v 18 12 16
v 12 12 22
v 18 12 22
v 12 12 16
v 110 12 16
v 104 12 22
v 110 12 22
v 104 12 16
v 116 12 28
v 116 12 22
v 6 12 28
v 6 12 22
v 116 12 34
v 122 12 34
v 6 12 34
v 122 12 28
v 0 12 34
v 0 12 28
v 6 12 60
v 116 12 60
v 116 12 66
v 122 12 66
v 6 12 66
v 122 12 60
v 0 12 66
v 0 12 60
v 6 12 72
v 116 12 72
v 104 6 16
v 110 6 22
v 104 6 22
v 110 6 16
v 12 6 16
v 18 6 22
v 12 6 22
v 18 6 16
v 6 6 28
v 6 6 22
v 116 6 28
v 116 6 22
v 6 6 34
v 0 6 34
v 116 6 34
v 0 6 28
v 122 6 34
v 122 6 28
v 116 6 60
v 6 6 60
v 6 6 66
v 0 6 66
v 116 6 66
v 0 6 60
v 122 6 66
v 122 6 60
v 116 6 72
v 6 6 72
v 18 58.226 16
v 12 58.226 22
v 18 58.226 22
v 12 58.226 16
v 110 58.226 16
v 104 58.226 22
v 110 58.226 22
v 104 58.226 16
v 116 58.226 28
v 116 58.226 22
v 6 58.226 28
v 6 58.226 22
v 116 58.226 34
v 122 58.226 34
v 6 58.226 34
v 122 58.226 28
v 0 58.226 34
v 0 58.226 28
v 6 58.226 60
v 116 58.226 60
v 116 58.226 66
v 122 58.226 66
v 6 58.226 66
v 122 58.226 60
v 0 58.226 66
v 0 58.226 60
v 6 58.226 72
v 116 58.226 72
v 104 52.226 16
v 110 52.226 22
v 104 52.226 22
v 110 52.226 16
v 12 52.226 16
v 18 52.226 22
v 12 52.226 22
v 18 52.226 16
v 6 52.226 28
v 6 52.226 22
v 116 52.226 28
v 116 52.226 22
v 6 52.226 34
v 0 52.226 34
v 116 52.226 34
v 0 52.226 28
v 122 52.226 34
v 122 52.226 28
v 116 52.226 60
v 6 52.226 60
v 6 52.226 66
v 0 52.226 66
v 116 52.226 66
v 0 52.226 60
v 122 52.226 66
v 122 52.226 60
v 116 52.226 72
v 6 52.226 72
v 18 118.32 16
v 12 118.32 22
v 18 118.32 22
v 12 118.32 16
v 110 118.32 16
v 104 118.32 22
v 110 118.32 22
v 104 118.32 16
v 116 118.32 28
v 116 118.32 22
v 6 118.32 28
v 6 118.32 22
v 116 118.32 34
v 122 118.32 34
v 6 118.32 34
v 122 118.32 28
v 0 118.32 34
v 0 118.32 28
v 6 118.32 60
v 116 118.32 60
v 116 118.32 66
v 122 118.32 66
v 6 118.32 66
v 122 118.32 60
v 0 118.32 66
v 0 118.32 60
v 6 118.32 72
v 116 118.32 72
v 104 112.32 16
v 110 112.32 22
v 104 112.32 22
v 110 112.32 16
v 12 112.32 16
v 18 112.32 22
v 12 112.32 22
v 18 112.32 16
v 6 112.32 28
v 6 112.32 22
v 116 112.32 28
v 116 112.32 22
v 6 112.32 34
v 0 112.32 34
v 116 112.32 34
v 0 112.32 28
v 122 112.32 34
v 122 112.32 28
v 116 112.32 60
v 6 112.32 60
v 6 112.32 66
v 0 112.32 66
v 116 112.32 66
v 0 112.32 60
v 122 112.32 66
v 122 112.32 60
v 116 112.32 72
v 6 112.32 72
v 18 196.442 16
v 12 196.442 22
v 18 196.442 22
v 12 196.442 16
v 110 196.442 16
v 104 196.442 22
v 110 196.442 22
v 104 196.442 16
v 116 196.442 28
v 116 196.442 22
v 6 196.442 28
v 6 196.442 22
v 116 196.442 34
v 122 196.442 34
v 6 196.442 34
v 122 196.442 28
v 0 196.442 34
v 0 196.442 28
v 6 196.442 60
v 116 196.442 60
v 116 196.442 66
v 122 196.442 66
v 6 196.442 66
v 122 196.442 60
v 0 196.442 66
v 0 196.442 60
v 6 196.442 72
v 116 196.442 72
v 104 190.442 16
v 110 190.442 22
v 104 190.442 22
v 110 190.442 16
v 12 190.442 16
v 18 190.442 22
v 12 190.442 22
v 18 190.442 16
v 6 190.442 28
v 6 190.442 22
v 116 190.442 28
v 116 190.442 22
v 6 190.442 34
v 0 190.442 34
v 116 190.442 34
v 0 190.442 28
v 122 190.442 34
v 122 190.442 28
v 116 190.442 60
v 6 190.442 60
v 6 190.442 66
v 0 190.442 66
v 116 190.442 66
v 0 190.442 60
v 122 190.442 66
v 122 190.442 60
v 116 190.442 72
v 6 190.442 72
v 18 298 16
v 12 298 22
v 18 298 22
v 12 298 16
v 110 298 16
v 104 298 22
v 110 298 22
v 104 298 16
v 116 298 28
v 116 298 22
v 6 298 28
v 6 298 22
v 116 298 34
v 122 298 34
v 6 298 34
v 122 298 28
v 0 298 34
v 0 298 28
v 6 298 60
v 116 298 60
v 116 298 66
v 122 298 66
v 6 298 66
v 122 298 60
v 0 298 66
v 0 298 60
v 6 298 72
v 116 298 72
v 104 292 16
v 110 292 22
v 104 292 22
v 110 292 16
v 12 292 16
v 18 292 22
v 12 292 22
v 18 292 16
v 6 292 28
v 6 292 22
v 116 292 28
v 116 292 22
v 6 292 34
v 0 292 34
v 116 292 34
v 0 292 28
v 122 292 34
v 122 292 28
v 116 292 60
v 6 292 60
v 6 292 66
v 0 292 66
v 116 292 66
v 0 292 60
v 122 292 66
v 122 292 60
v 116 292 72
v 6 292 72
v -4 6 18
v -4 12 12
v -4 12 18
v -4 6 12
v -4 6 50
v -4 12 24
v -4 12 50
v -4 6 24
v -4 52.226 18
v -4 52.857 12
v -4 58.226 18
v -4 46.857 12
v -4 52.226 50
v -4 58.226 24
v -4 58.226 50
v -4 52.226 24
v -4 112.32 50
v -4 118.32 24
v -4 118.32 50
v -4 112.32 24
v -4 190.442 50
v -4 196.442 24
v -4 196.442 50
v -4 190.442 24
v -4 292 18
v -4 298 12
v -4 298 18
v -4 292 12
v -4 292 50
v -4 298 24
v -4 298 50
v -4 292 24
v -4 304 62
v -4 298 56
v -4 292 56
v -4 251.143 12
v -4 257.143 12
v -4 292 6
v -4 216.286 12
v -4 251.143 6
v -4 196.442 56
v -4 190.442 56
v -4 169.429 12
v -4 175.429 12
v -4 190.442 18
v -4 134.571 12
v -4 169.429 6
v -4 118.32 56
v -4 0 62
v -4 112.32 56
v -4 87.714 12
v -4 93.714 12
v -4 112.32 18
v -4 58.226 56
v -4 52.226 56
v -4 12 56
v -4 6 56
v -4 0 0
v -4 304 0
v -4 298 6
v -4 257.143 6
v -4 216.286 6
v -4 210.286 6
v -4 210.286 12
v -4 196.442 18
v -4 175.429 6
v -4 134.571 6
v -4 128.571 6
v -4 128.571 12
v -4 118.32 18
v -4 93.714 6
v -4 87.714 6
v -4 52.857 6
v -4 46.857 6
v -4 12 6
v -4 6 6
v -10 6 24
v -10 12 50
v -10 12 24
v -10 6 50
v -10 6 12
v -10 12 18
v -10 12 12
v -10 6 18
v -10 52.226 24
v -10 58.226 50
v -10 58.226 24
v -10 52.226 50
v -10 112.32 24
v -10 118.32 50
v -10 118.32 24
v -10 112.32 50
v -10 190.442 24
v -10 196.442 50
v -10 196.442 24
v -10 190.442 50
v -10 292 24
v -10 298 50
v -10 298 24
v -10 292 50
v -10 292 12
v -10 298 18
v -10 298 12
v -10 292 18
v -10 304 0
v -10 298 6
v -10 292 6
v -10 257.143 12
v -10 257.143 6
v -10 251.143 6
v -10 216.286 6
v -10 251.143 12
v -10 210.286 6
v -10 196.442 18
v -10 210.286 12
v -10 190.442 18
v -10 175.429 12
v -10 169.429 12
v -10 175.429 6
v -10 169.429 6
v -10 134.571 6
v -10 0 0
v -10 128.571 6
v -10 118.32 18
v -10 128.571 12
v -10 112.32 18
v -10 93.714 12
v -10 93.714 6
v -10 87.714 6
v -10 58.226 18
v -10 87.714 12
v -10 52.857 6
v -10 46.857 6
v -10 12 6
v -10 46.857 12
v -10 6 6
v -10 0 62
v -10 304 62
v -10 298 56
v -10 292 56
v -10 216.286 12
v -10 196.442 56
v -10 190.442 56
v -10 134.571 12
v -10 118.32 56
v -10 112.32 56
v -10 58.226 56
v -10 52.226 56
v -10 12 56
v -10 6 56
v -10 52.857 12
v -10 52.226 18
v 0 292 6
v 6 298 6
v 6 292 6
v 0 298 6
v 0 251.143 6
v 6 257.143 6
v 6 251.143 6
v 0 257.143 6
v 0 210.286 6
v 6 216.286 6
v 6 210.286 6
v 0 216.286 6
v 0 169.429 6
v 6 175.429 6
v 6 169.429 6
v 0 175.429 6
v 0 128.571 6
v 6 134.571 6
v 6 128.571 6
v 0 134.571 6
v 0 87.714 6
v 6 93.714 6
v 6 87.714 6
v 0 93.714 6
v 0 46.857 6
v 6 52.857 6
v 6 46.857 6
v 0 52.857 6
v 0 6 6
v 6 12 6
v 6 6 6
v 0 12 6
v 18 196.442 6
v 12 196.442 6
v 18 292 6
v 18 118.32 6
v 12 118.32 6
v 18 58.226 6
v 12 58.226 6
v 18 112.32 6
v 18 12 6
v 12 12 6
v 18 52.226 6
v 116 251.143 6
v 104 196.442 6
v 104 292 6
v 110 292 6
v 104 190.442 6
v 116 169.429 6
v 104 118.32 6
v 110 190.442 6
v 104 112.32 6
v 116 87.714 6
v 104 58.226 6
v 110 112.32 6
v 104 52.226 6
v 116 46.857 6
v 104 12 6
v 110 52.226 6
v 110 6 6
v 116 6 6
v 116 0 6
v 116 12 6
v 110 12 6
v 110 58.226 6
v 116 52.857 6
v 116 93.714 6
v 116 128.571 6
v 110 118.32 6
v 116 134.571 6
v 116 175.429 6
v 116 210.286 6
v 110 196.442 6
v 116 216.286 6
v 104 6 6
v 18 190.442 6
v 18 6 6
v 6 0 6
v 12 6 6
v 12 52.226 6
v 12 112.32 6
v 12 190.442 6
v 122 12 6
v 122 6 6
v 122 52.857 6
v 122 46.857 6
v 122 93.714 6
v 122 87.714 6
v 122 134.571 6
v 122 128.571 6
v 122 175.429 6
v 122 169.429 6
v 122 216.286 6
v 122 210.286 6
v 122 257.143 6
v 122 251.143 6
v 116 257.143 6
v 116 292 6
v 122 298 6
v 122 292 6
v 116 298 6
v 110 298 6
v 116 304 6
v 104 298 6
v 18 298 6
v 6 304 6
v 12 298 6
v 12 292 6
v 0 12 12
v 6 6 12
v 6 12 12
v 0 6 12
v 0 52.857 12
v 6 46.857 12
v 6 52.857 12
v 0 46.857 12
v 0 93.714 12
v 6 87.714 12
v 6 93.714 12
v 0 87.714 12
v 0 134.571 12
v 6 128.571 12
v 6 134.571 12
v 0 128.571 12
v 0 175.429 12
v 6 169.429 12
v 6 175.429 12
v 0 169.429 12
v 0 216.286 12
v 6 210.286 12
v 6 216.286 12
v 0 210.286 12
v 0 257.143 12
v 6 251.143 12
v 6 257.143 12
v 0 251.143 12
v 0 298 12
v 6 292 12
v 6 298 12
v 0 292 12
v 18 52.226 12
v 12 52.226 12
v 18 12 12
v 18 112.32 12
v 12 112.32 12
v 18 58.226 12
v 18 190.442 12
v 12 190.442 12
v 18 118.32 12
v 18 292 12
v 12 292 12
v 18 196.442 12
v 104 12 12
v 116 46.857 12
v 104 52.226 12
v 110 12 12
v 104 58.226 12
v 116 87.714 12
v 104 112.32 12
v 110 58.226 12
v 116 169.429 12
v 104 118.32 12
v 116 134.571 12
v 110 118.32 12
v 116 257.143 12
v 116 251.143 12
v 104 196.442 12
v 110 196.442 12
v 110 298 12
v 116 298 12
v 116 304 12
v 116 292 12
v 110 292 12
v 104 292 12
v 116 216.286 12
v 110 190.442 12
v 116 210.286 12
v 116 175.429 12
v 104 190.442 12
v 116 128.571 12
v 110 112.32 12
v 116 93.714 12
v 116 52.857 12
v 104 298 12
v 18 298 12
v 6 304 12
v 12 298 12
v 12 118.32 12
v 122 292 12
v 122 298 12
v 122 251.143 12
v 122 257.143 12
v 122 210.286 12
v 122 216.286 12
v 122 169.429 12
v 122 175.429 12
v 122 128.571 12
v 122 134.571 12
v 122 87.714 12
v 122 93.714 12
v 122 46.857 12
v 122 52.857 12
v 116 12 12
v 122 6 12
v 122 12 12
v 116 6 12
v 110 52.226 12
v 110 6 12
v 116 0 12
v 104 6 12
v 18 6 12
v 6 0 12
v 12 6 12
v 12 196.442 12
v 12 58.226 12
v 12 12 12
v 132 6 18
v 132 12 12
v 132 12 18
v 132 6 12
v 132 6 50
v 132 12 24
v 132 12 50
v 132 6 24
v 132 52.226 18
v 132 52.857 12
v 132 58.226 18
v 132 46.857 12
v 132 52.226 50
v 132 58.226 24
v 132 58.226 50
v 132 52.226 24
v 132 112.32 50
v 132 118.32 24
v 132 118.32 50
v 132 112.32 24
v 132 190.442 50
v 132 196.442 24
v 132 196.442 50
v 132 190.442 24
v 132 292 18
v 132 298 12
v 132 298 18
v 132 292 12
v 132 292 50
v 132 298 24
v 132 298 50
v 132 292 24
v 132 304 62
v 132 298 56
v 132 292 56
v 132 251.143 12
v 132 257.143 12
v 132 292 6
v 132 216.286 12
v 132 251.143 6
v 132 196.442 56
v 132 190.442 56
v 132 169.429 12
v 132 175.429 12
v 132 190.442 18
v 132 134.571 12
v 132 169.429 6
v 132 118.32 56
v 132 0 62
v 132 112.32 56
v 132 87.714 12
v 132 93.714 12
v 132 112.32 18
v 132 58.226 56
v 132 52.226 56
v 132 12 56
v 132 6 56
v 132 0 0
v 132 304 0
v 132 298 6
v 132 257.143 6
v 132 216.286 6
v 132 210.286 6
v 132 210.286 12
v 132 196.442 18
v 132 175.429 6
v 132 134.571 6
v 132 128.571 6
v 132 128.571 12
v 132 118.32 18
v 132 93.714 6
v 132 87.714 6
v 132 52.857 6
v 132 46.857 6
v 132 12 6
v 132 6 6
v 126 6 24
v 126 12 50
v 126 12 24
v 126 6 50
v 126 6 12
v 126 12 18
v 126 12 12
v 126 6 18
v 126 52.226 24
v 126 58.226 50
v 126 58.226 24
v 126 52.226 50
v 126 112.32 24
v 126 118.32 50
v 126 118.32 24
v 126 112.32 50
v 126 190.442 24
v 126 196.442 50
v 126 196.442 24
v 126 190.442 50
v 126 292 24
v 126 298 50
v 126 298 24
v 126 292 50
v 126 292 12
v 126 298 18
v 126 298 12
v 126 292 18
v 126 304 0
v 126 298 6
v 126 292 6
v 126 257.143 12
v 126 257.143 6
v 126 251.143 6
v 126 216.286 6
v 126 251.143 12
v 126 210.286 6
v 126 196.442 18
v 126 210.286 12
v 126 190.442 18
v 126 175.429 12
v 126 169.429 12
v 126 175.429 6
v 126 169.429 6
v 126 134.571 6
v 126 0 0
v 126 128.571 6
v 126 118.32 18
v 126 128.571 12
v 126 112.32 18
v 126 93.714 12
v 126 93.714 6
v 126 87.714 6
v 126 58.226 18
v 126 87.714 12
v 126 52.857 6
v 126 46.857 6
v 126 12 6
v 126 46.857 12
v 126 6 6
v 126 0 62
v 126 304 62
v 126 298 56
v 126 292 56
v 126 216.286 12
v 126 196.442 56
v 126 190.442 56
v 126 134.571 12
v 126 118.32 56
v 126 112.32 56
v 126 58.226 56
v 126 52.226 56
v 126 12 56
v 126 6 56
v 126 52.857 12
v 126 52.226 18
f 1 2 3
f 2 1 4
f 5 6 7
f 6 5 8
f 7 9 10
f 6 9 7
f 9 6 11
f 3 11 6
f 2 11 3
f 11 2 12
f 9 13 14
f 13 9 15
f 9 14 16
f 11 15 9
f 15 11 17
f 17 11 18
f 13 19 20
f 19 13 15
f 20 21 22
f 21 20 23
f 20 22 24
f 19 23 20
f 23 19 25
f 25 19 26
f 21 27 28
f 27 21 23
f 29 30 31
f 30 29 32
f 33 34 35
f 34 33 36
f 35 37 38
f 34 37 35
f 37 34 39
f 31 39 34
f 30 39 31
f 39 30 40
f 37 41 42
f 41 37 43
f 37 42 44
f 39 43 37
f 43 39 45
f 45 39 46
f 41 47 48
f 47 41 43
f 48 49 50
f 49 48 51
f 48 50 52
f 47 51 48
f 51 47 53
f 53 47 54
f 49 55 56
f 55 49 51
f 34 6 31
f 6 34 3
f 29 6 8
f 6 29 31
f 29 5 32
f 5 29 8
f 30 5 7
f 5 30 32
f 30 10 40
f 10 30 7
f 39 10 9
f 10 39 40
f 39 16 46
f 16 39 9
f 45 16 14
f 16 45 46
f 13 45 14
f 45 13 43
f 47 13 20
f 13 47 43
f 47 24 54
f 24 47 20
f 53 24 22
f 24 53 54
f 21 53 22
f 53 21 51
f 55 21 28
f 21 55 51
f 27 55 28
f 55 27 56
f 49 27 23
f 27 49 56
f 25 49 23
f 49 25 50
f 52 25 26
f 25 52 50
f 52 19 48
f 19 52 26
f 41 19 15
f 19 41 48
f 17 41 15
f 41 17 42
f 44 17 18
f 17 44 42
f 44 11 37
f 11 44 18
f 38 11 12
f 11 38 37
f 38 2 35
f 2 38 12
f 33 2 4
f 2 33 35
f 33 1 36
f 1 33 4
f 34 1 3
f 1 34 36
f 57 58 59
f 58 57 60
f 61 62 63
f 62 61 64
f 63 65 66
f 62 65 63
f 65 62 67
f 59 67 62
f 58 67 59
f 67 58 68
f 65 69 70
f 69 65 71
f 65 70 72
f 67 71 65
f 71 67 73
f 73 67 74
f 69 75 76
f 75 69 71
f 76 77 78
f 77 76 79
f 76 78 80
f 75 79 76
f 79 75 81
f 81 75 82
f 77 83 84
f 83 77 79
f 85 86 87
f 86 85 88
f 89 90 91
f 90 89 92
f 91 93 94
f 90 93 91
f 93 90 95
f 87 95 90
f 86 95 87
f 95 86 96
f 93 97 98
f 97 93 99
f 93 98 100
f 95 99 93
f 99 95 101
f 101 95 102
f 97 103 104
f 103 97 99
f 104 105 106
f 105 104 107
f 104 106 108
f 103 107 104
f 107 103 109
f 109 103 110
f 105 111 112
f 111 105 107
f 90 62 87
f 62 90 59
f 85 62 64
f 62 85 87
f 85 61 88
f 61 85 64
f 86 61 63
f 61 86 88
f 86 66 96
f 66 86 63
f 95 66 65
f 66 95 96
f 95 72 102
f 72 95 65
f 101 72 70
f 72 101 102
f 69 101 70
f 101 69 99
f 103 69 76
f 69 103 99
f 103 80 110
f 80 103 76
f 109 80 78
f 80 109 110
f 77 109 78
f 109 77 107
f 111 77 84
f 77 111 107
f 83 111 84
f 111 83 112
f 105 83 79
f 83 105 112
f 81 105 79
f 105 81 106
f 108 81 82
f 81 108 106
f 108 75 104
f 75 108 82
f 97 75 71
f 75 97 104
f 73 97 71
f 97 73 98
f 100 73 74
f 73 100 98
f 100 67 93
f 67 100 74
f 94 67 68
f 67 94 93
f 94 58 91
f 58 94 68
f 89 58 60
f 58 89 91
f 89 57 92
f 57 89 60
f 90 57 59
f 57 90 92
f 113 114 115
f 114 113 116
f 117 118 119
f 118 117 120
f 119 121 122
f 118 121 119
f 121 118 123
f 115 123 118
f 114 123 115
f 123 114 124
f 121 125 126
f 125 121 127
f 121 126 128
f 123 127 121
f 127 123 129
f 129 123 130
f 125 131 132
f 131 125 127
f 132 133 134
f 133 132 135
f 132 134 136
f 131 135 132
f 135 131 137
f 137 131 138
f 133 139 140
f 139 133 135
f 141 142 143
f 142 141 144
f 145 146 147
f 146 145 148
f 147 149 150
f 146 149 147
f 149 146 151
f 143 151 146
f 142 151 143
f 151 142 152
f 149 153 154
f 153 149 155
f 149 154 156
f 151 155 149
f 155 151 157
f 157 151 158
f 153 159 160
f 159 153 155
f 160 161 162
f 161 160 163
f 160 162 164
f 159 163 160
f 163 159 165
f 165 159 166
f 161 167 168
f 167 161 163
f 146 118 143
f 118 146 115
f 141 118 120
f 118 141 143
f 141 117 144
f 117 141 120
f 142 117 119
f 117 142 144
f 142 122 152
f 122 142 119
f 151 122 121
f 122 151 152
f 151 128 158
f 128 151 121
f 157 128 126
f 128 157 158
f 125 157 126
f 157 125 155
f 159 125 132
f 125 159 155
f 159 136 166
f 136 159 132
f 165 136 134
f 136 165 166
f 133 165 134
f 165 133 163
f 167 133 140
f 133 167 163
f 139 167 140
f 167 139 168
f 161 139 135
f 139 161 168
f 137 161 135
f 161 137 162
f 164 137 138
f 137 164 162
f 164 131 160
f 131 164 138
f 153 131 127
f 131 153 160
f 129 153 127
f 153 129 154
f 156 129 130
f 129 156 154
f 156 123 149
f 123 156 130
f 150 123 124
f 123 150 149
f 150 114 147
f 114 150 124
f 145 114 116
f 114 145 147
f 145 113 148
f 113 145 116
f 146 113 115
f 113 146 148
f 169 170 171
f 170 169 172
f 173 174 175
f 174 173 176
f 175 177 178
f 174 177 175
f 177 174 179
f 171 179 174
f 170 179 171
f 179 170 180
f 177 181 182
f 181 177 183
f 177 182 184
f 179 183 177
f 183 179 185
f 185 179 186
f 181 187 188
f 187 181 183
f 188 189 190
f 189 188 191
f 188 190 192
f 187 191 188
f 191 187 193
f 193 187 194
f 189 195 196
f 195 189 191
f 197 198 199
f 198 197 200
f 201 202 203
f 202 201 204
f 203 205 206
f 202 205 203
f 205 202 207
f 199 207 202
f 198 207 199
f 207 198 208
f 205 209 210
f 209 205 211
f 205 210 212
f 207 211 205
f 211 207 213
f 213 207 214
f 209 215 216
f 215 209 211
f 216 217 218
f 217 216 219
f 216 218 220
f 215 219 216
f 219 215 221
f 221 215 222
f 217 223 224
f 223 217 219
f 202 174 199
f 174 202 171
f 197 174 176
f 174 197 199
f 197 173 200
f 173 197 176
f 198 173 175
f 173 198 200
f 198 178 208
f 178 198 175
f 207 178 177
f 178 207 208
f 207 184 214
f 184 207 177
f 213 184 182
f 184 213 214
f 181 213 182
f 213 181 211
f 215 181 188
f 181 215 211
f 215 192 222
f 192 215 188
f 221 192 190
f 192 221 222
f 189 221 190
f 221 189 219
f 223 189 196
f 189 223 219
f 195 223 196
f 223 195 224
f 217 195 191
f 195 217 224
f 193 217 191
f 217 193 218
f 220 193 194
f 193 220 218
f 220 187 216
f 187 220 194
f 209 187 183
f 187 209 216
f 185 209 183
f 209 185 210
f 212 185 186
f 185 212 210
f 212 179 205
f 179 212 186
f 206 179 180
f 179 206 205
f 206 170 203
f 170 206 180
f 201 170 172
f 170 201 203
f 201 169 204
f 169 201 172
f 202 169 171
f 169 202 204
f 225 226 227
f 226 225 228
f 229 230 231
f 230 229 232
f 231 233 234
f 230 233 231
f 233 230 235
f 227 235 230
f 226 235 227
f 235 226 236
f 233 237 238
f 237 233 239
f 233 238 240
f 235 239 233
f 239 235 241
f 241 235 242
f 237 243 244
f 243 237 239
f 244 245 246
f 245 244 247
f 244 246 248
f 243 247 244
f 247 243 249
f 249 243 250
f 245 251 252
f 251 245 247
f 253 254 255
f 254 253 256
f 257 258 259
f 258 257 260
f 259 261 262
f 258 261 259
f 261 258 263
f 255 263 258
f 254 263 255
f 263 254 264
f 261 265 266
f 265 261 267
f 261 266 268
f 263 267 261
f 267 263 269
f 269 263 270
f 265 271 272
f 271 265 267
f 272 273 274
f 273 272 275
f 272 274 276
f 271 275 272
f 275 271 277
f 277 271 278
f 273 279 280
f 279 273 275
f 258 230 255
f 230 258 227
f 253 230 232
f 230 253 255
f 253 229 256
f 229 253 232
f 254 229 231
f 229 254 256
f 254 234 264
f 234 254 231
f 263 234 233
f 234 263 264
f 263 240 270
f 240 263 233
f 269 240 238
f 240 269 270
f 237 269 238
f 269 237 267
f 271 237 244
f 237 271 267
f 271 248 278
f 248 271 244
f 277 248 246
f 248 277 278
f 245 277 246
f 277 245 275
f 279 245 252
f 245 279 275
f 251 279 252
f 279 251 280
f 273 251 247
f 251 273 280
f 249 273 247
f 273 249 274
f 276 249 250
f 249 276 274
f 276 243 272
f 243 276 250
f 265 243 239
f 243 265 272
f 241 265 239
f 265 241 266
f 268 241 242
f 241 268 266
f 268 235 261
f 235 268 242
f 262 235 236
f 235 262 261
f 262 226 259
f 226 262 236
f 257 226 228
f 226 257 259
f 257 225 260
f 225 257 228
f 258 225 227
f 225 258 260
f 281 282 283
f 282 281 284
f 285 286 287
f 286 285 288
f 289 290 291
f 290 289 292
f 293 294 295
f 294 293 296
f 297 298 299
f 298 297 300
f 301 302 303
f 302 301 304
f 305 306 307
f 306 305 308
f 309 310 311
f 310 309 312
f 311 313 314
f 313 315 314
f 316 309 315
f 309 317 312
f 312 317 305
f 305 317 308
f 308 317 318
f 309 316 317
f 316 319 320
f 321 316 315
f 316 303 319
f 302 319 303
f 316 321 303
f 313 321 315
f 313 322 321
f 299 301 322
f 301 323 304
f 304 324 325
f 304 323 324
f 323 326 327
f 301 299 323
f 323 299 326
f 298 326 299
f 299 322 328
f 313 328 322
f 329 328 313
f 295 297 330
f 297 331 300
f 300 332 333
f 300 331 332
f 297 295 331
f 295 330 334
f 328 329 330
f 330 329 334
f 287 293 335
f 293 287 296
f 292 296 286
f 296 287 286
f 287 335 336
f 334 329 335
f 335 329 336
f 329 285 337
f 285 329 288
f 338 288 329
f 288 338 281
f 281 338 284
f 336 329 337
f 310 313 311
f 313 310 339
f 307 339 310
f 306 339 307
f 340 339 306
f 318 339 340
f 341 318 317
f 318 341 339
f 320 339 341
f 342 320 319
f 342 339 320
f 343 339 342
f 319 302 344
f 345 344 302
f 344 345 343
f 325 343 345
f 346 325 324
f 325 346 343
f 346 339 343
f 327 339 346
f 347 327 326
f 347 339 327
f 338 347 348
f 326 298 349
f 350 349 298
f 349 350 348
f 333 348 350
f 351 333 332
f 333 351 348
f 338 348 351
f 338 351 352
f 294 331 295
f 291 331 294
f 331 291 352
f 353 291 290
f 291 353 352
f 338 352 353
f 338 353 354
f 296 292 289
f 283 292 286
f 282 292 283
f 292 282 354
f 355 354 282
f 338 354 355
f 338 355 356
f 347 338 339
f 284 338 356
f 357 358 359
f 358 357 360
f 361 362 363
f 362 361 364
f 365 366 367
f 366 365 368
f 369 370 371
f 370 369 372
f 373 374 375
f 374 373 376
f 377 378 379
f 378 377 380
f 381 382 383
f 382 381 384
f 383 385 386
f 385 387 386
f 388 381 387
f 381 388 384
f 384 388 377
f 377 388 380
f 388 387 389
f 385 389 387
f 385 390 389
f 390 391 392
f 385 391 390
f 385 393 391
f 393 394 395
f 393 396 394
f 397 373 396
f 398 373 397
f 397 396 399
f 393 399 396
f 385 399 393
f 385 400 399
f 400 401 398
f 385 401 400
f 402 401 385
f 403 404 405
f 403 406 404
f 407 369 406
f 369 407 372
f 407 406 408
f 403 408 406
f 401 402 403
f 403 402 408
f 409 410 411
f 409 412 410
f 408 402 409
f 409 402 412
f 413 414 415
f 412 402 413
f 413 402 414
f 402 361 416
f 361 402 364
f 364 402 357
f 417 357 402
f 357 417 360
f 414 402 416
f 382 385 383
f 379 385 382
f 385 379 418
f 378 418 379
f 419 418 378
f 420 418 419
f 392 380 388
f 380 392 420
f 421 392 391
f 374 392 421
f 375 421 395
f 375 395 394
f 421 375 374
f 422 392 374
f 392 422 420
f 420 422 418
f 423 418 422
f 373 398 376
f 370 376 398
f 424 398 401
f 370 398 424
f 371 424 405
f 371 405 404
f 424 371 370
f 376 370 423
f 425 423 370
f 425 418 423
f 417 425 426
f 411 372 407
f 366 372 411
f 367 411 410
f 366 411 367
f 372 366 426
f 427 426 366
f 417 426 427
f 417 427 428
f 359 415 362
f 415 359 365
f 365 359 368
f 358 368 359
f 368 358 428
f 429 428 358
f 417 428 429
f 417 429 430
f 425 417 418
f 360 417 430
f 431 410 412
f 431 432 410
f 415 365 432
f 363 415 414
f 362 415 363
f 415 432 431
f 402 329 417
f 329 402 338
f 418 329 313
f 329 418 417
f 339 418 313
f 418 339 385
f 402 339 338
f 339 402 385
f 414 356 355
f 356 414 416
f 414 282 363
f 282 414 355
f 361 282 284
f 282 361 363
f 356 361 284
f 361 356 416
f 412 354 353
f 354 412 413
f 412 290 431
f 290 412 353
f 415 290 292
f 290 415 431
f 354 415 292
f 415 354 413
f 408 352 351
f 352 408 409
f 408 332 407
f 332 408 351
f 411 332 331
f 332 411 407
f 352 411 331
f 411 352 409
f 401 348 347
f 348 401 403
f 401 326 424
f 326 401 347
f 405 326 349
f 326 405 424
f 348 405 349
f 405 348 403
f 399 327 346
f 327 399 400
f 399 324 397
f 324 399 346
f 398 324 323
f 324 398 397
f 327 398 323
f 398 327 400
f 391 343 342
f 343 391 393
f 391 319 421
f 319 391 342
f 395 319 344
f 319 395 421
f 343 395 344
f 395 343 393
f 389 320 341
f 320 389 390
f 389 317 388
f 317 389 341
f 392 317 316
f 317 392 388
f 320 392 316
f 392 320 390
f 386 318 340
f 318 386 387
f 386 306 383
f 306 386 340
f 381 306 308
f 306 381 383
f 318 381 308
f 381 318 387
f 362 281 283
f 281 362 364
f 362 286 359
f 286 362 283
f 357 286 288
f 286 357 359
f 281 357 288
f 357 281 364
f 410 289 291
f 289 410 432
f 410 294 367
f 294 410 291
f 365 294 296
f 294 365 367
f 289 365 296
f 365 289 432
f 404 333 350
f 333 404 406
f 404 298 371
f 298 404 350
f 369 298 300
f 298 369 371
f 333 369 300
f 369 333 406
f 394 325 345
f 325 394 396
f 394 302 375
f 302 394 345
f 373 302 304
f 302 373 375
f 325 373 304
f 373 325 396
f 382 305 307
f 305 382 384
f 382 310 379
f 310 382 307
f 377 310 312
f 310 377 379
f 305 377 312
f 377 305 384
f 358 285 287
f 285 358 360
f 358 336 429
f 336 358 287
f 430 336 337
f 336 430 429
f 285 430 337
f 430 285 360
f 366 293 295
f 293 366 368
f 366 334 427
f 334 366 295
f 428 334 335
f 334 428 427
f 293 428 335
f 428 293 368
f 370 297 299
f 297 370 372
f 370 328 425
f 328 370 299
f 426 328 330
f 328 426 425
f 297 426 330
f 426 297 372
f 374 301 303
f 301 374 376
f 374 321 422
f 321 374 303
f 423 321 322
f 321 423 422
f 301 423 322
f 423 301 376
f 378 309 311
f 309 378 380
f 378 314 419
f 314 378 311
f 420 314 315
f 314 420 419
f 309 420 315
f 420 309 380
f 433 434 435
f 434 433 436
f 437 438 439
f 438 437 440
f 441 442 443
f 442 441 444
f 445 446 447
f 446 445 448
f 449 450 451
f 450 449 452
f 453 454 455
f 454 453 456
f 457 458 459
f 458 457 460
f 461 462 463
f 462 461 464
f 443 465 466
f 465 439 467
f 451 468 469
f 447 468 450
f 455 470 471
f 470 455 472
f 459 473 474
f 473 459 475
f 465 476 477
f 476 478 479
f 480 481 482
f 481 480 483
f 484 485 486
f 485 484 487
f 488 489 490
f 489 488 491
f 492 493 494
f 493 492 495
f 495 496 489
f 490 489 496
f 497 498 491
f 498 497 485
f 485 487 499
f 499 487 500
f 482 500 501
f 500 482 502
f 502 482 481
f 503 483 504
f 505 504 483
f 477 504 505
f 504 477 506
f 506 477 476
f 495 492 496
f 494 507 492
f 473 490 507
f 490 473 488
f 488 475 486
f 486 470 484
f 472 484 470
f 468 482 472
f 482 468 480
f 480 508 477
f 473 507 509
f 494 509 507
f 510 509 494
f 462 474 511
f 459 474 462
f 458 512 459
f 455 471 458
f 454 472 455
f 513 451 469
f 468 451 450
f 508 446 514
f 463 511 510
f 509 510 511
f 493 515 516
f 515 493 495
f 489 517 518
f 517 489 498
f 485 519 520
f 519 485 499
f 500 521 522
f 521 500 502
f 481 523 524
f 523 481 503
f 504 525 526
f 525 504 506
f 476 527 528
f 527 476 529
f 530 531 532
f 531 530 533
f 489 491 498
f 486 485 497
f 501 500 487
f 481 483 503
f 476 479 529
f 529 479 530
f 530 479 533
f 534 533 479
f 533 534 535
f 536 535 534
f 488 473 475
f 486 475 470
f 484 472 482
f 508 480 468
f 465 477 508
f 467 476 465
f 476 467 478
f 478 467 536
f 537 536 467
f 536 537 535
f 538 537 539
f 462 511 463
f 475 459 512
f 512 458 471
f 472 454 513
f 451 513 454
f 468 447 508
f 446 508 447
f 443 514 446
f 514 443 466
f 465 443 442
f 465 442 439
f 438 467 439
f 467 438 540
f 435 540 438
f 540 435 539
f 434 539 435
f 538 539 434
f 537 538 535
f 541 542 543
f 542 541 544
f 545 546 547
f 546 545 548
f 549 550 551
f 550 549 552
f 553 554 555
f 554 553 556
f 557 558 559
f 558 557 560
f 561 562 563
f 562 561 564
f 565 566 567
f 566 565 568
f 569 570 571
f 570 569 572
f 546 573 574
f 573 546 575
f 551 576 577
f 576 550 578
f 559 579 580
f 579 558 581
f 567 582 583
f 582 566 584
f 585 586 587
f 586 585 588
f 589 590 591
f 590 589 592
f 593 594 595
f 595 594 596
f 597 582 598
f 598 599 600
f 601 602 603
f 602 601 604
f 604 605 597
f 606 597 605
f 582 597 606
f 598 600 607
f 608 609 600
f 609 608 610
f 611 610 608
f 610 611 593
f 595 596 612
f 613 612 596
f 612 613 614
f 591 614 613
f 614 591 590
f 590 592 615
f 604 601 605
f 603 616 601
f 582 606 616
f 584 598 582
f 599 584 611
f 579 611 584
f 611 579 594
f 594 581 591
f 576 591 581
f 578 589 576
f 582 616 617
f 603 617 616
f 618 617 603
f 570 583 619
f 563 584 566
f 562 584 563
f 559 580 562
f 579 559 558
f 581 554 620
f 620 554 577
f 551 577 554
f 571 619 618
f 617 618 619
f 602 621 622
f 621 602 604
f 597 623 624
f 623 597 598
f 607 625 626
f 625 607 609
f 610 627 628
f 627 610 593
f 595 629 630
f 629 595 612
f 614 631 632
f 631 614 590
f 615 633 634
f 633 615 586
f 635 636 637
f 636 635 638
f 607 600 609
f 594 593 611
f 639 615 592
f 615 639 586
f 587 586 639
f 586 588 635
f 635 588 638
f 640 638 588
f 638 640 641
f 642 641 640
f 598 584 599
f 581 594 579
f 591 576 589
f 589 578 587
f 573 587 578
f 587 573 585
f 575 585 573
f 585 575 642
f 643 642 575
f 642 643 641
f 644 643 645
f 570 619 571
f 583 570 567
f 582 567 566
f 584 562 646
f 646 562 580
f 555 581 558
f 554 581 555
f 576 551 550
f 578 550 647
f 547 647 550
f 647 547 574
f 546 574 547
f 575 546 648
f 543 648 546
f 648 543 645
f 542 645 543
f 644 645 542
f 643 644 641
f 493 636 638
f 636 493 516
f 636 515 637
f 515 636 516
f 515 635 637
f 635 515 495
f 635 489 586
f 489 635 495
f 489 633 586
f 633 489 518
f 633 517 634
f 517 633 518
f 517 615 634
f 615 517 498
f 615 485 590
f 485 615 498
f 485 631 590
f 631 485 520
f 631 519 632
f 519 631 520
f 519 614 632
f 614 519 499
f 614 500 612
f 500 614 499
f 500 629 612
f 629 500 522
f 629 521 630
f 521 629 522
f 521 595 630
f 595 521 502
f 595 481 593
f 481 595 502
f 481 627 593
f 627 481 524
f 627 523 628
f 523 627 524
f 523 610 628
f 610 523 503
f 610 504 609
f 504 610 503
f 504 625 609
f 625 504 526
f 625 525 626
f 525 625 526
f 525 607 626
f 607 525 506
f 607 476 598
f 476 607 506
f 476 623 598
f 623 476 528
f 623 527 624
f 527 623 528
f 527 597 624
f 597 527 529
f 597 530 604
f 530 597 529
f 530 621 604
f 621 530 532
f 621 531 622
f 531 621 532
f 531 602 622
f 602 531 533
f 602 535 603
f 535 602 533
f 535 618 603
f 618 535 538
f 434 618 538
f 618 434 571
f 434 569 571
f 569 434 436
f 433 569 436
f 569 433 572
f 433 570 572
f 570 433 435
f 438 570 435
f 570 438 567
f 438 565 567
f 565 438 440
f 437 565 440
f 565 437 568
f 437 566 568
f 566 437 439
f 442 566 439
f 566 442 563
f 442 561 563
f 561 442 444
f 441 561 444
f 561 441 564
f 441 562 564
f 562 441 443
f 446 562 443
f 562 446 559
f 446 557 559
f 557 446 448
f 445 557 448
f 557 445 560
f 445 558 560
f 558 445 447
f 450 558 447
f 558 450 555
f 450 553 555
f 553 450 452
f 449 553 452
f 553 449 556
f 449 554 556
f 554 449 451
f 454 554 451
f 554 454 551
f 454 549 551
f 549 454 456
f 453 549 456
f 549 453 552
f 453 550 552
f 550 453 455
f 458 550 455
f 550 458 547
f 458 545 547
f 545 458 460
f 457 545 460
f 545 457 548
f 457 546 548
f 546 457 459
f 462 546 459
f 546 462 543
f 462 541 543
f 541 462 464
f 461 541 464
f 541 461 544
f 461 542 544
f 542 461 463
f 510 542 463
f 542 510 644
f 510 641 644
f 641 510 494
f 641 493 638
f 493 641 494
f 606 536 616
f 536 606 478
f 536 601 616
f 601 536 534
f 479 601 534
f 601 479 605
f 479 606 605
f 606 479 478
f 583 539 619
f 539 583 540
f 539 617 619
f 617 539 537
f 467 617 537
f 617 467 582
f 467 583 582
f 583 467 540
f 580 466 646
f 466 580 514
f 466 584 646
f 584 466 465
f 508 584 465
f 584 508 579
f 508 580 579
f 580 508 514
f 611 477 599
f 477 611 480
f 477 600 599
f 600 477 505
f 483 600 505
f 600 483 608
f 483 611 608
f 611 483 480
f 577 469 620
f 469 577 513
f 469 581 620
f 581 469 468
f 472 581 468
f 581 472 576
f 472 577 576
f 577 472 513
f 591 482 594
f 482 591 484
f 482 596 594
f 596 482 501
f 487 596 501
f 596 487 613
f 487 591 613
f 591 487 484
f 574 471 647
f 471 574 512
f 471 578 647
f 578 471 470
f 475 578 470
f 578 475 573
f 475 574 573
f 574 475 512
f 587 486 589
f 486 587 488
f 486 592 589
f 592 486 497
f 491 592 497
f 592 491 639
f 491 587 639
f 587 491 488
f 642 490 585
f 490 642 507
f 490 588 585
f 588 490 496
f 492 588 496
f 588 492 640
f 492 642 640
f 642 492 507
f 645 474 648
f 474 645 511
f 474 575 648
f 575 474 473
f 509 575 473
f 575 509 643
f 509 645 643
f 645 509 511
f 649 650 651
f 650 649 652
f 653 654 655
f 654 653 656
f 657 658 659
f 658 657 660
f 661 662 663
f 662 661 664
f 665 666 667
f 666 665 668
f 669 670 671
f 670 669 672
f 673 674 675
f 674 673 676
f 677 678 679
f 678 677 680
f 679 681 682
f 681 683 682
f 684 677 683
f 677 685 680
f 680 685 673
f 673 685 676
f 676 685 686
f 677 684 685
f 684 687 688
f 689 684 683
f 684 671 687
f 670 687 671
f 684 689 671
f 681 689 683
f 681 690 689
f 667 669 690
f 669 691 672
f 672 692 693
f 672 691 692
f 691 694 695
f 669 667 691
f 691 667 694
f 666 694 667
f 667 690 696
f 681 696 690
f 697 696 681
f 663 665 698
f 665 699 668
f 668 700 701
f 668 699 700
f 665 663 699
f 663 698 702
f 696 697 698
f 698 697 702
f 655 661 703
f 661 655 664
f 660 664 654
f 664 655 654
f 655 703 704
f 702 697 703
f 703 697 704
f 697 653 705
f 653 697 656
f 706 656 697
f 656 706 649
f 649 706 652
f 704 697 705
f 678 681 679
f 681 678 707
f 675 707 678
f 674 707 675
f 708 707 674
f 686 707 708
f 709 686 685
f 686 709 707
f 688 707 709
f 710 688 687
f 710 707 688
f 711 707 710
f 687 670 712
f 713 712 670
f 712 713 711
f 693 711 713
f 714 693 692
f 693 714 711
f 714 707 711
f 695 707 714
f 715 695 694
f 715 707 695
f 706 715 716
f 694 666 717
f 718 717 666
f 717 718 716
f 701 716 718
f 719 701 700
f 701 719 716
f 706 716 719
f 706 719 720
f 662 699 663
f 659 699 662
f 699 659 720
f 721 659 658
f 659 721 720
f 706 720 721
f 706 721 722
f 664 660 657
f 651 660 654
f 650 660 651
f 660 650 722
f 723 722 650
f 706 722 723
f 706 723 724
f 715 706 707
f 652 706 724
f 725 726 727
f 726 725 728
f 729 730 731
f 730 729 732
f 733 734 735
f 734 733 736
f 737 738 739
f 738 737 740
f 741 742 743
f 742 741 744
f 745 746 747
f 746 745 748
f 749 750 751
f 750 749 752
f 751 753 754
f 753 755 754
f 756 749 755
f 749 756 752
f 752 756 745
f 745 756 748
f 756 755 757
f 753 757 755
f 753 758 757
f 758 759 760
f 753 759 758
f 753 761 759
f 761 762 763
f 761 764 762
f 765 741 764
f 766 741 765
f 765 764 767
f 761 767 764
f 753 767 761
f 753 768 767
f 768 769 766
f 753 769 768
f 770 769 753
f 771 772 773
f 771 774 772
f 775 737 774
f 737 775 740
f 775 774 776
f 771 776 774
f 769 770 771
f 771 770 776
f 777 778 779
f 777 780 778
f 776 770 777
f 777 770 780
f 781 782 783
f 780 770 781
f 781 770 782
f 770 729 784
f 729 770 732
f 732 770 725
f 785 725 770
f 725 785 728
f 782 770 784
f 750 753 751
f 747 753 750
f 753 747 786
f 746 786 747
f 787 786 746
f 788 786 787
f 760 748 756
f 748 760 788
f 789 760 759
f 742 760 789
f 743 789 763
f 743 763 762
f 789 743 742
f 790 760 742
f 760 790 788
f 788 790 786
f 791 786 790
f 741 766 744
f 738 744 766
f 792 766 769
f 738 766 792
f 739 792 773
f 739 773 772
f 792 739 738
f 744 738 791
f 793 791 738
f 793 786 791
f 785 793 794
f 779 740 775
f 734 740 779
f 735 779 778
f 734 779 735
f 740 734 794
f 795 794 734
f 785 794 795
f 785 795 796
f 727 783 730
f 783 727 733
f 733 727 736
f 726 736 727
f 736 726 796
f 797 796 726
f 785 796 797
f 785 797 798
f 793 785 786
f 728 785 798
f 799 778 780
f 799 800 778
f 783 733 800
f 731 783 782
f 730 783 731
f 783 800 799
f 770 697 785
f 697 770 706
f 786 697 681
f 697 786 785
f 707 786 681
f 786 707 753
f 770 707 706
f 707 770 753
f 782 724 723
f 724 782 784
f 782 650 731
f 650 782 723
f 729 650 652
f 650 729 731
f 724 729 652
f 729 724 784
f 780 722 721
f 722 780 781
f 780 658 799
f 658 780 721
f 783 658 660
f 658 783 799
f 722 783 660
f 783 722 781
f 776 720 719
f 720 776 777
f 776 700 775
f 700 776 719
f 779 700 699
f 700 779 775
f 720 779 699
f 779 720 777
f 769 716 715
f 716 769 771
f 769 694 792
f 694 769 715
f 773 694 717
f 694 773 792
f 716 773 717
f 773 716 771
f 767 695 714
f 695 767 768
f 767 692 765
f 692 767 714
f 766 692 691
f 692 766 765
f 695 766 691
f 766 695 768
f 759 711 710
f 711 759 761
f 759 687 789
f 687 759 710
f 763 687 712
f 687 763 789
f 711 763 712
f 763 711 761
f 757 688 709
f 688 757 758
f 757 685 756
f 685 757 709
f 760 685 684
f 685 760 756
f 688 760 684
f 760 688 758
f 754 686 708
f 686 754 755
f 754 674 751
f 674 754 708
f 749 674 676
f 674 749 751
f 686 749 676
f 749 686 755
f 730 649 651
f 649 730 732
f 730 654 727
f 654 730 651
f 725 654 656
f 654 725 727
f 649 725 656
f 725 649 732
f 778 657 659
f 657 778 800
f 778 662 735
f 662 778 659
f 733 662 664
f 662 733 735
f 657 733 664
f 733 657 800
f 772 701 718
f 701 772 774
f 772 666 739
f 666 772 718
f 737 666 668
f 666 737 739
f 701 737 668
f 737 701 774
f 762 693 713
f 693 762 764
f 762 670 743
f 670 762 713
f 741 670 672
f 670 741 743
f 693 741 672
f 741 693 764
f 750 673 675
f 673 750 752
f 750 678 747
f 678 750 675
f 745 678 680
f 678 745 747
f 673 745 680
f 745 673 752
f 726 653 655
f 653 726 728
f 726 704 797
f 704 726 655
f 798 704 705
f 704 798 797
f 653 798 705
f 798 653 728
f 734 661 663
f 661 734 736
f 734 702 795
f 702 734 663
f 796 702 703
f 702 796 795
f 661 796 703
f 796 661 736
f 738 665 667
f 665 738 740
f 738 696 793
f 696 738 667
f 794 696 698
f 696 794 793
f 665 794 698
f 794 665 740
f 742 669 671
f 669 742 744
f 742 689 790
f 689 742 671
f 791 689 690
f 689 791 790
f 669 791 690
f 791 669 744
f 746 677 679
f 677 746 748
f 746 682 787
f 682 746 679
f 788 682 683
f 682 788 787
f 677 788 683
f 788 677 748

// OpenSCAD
h = 50;
b = 110;
t = 6;

steps = 4;
bsteps = 7;
factor = 1.3;

len = (h+2*t) * (steps + 1) - t;
scale = (len - 3*t) / (pow(factor, steps+1) - factor);

function fach_pos(i) = 2*t + scale * (pow(factor, i+1) - factor);

explode = 10;

module fach()
 {
	square([ b, h ]);
	translate([ -t, h-2*t ]) square([ t*2, t ]);
	translate([ -t, t ]) square([ t*2, t ]);
	translate([ b-t, h-2*t ]) square([ t*2, t ]);
	translate([ b-t, t ]) square([ t*2, t ]);
	translate([ t, -t ]) square([ t, t*2 ]);
	translate([ b-t*2, -t ]) square([ t, t*2 ]);
}

module fstack()
{
	for (i = [0 : steps])
		translate([ t, fach_pos(i), 2*t ]) rotate([ 90, 0, 0 ])
			linear_extrude(height = t) fach();
}

module bottom()
{
	projection(cut = true)
	translate([ 0, 0, -t*1.5 ])
	difference() {
		translate([ t, 0, t ])
		cube([ b, len, t ]);
		fstack();
	}

	for (i = [0 : bsteps]) {
		translate([ 0, t + i*(len-3*t) / bsteps, 0 ]) square([ t*1.5, t ]);
		translate([ b+t/2, t + i*(len-3*t) / bsteps, 0 ]) square([ t*1.5, t ]);
	}
}

module side()
{
	projection(cut = true)
	translate([ 0, 0, t/2 ])
	rotate([ 0, 90, 0 ])
	difference() {
		cube([ t, len, h+2*t ]);
		fstack();
		translate([ 0, 0, t ]) linear_extrude(height = t) bottom();
	}
}

module layout()
{
	side();
	translate([ h+t*3, 0 ]) bottom();
	translate([ h+b+t*6, len ]) mirror([ 0, 1 ]) side();
	for (i = [0 : steps])
		translate([ 2*h+b+t*10, (h+2*t)*i + t ]) fach();
}

module assembled()
{
	translate([ t-explode, 0, 0 ]) rotate([ 0, -90, 0 ])
	color([ 0.3, 0.7, 0.3 ]) linear_extrude(height = t) side();

	translate([ 0, 0, t ])
	color([ 0.7, 0.3, 0.3 ]) linear_extrude(height = t) bottom();

	translate([ b+2*t+explode, 0, 0 ]) rotate([ 0, -90, 0 ])
	color([ 0.3, 0.7, 0.3 ]) linear_extrude(height = t) side();

	translate([ 0, 0, explode ])
	color([ 0.3, 0.3, 0.7 ]) fstack();
}

// layout();
assembled();
